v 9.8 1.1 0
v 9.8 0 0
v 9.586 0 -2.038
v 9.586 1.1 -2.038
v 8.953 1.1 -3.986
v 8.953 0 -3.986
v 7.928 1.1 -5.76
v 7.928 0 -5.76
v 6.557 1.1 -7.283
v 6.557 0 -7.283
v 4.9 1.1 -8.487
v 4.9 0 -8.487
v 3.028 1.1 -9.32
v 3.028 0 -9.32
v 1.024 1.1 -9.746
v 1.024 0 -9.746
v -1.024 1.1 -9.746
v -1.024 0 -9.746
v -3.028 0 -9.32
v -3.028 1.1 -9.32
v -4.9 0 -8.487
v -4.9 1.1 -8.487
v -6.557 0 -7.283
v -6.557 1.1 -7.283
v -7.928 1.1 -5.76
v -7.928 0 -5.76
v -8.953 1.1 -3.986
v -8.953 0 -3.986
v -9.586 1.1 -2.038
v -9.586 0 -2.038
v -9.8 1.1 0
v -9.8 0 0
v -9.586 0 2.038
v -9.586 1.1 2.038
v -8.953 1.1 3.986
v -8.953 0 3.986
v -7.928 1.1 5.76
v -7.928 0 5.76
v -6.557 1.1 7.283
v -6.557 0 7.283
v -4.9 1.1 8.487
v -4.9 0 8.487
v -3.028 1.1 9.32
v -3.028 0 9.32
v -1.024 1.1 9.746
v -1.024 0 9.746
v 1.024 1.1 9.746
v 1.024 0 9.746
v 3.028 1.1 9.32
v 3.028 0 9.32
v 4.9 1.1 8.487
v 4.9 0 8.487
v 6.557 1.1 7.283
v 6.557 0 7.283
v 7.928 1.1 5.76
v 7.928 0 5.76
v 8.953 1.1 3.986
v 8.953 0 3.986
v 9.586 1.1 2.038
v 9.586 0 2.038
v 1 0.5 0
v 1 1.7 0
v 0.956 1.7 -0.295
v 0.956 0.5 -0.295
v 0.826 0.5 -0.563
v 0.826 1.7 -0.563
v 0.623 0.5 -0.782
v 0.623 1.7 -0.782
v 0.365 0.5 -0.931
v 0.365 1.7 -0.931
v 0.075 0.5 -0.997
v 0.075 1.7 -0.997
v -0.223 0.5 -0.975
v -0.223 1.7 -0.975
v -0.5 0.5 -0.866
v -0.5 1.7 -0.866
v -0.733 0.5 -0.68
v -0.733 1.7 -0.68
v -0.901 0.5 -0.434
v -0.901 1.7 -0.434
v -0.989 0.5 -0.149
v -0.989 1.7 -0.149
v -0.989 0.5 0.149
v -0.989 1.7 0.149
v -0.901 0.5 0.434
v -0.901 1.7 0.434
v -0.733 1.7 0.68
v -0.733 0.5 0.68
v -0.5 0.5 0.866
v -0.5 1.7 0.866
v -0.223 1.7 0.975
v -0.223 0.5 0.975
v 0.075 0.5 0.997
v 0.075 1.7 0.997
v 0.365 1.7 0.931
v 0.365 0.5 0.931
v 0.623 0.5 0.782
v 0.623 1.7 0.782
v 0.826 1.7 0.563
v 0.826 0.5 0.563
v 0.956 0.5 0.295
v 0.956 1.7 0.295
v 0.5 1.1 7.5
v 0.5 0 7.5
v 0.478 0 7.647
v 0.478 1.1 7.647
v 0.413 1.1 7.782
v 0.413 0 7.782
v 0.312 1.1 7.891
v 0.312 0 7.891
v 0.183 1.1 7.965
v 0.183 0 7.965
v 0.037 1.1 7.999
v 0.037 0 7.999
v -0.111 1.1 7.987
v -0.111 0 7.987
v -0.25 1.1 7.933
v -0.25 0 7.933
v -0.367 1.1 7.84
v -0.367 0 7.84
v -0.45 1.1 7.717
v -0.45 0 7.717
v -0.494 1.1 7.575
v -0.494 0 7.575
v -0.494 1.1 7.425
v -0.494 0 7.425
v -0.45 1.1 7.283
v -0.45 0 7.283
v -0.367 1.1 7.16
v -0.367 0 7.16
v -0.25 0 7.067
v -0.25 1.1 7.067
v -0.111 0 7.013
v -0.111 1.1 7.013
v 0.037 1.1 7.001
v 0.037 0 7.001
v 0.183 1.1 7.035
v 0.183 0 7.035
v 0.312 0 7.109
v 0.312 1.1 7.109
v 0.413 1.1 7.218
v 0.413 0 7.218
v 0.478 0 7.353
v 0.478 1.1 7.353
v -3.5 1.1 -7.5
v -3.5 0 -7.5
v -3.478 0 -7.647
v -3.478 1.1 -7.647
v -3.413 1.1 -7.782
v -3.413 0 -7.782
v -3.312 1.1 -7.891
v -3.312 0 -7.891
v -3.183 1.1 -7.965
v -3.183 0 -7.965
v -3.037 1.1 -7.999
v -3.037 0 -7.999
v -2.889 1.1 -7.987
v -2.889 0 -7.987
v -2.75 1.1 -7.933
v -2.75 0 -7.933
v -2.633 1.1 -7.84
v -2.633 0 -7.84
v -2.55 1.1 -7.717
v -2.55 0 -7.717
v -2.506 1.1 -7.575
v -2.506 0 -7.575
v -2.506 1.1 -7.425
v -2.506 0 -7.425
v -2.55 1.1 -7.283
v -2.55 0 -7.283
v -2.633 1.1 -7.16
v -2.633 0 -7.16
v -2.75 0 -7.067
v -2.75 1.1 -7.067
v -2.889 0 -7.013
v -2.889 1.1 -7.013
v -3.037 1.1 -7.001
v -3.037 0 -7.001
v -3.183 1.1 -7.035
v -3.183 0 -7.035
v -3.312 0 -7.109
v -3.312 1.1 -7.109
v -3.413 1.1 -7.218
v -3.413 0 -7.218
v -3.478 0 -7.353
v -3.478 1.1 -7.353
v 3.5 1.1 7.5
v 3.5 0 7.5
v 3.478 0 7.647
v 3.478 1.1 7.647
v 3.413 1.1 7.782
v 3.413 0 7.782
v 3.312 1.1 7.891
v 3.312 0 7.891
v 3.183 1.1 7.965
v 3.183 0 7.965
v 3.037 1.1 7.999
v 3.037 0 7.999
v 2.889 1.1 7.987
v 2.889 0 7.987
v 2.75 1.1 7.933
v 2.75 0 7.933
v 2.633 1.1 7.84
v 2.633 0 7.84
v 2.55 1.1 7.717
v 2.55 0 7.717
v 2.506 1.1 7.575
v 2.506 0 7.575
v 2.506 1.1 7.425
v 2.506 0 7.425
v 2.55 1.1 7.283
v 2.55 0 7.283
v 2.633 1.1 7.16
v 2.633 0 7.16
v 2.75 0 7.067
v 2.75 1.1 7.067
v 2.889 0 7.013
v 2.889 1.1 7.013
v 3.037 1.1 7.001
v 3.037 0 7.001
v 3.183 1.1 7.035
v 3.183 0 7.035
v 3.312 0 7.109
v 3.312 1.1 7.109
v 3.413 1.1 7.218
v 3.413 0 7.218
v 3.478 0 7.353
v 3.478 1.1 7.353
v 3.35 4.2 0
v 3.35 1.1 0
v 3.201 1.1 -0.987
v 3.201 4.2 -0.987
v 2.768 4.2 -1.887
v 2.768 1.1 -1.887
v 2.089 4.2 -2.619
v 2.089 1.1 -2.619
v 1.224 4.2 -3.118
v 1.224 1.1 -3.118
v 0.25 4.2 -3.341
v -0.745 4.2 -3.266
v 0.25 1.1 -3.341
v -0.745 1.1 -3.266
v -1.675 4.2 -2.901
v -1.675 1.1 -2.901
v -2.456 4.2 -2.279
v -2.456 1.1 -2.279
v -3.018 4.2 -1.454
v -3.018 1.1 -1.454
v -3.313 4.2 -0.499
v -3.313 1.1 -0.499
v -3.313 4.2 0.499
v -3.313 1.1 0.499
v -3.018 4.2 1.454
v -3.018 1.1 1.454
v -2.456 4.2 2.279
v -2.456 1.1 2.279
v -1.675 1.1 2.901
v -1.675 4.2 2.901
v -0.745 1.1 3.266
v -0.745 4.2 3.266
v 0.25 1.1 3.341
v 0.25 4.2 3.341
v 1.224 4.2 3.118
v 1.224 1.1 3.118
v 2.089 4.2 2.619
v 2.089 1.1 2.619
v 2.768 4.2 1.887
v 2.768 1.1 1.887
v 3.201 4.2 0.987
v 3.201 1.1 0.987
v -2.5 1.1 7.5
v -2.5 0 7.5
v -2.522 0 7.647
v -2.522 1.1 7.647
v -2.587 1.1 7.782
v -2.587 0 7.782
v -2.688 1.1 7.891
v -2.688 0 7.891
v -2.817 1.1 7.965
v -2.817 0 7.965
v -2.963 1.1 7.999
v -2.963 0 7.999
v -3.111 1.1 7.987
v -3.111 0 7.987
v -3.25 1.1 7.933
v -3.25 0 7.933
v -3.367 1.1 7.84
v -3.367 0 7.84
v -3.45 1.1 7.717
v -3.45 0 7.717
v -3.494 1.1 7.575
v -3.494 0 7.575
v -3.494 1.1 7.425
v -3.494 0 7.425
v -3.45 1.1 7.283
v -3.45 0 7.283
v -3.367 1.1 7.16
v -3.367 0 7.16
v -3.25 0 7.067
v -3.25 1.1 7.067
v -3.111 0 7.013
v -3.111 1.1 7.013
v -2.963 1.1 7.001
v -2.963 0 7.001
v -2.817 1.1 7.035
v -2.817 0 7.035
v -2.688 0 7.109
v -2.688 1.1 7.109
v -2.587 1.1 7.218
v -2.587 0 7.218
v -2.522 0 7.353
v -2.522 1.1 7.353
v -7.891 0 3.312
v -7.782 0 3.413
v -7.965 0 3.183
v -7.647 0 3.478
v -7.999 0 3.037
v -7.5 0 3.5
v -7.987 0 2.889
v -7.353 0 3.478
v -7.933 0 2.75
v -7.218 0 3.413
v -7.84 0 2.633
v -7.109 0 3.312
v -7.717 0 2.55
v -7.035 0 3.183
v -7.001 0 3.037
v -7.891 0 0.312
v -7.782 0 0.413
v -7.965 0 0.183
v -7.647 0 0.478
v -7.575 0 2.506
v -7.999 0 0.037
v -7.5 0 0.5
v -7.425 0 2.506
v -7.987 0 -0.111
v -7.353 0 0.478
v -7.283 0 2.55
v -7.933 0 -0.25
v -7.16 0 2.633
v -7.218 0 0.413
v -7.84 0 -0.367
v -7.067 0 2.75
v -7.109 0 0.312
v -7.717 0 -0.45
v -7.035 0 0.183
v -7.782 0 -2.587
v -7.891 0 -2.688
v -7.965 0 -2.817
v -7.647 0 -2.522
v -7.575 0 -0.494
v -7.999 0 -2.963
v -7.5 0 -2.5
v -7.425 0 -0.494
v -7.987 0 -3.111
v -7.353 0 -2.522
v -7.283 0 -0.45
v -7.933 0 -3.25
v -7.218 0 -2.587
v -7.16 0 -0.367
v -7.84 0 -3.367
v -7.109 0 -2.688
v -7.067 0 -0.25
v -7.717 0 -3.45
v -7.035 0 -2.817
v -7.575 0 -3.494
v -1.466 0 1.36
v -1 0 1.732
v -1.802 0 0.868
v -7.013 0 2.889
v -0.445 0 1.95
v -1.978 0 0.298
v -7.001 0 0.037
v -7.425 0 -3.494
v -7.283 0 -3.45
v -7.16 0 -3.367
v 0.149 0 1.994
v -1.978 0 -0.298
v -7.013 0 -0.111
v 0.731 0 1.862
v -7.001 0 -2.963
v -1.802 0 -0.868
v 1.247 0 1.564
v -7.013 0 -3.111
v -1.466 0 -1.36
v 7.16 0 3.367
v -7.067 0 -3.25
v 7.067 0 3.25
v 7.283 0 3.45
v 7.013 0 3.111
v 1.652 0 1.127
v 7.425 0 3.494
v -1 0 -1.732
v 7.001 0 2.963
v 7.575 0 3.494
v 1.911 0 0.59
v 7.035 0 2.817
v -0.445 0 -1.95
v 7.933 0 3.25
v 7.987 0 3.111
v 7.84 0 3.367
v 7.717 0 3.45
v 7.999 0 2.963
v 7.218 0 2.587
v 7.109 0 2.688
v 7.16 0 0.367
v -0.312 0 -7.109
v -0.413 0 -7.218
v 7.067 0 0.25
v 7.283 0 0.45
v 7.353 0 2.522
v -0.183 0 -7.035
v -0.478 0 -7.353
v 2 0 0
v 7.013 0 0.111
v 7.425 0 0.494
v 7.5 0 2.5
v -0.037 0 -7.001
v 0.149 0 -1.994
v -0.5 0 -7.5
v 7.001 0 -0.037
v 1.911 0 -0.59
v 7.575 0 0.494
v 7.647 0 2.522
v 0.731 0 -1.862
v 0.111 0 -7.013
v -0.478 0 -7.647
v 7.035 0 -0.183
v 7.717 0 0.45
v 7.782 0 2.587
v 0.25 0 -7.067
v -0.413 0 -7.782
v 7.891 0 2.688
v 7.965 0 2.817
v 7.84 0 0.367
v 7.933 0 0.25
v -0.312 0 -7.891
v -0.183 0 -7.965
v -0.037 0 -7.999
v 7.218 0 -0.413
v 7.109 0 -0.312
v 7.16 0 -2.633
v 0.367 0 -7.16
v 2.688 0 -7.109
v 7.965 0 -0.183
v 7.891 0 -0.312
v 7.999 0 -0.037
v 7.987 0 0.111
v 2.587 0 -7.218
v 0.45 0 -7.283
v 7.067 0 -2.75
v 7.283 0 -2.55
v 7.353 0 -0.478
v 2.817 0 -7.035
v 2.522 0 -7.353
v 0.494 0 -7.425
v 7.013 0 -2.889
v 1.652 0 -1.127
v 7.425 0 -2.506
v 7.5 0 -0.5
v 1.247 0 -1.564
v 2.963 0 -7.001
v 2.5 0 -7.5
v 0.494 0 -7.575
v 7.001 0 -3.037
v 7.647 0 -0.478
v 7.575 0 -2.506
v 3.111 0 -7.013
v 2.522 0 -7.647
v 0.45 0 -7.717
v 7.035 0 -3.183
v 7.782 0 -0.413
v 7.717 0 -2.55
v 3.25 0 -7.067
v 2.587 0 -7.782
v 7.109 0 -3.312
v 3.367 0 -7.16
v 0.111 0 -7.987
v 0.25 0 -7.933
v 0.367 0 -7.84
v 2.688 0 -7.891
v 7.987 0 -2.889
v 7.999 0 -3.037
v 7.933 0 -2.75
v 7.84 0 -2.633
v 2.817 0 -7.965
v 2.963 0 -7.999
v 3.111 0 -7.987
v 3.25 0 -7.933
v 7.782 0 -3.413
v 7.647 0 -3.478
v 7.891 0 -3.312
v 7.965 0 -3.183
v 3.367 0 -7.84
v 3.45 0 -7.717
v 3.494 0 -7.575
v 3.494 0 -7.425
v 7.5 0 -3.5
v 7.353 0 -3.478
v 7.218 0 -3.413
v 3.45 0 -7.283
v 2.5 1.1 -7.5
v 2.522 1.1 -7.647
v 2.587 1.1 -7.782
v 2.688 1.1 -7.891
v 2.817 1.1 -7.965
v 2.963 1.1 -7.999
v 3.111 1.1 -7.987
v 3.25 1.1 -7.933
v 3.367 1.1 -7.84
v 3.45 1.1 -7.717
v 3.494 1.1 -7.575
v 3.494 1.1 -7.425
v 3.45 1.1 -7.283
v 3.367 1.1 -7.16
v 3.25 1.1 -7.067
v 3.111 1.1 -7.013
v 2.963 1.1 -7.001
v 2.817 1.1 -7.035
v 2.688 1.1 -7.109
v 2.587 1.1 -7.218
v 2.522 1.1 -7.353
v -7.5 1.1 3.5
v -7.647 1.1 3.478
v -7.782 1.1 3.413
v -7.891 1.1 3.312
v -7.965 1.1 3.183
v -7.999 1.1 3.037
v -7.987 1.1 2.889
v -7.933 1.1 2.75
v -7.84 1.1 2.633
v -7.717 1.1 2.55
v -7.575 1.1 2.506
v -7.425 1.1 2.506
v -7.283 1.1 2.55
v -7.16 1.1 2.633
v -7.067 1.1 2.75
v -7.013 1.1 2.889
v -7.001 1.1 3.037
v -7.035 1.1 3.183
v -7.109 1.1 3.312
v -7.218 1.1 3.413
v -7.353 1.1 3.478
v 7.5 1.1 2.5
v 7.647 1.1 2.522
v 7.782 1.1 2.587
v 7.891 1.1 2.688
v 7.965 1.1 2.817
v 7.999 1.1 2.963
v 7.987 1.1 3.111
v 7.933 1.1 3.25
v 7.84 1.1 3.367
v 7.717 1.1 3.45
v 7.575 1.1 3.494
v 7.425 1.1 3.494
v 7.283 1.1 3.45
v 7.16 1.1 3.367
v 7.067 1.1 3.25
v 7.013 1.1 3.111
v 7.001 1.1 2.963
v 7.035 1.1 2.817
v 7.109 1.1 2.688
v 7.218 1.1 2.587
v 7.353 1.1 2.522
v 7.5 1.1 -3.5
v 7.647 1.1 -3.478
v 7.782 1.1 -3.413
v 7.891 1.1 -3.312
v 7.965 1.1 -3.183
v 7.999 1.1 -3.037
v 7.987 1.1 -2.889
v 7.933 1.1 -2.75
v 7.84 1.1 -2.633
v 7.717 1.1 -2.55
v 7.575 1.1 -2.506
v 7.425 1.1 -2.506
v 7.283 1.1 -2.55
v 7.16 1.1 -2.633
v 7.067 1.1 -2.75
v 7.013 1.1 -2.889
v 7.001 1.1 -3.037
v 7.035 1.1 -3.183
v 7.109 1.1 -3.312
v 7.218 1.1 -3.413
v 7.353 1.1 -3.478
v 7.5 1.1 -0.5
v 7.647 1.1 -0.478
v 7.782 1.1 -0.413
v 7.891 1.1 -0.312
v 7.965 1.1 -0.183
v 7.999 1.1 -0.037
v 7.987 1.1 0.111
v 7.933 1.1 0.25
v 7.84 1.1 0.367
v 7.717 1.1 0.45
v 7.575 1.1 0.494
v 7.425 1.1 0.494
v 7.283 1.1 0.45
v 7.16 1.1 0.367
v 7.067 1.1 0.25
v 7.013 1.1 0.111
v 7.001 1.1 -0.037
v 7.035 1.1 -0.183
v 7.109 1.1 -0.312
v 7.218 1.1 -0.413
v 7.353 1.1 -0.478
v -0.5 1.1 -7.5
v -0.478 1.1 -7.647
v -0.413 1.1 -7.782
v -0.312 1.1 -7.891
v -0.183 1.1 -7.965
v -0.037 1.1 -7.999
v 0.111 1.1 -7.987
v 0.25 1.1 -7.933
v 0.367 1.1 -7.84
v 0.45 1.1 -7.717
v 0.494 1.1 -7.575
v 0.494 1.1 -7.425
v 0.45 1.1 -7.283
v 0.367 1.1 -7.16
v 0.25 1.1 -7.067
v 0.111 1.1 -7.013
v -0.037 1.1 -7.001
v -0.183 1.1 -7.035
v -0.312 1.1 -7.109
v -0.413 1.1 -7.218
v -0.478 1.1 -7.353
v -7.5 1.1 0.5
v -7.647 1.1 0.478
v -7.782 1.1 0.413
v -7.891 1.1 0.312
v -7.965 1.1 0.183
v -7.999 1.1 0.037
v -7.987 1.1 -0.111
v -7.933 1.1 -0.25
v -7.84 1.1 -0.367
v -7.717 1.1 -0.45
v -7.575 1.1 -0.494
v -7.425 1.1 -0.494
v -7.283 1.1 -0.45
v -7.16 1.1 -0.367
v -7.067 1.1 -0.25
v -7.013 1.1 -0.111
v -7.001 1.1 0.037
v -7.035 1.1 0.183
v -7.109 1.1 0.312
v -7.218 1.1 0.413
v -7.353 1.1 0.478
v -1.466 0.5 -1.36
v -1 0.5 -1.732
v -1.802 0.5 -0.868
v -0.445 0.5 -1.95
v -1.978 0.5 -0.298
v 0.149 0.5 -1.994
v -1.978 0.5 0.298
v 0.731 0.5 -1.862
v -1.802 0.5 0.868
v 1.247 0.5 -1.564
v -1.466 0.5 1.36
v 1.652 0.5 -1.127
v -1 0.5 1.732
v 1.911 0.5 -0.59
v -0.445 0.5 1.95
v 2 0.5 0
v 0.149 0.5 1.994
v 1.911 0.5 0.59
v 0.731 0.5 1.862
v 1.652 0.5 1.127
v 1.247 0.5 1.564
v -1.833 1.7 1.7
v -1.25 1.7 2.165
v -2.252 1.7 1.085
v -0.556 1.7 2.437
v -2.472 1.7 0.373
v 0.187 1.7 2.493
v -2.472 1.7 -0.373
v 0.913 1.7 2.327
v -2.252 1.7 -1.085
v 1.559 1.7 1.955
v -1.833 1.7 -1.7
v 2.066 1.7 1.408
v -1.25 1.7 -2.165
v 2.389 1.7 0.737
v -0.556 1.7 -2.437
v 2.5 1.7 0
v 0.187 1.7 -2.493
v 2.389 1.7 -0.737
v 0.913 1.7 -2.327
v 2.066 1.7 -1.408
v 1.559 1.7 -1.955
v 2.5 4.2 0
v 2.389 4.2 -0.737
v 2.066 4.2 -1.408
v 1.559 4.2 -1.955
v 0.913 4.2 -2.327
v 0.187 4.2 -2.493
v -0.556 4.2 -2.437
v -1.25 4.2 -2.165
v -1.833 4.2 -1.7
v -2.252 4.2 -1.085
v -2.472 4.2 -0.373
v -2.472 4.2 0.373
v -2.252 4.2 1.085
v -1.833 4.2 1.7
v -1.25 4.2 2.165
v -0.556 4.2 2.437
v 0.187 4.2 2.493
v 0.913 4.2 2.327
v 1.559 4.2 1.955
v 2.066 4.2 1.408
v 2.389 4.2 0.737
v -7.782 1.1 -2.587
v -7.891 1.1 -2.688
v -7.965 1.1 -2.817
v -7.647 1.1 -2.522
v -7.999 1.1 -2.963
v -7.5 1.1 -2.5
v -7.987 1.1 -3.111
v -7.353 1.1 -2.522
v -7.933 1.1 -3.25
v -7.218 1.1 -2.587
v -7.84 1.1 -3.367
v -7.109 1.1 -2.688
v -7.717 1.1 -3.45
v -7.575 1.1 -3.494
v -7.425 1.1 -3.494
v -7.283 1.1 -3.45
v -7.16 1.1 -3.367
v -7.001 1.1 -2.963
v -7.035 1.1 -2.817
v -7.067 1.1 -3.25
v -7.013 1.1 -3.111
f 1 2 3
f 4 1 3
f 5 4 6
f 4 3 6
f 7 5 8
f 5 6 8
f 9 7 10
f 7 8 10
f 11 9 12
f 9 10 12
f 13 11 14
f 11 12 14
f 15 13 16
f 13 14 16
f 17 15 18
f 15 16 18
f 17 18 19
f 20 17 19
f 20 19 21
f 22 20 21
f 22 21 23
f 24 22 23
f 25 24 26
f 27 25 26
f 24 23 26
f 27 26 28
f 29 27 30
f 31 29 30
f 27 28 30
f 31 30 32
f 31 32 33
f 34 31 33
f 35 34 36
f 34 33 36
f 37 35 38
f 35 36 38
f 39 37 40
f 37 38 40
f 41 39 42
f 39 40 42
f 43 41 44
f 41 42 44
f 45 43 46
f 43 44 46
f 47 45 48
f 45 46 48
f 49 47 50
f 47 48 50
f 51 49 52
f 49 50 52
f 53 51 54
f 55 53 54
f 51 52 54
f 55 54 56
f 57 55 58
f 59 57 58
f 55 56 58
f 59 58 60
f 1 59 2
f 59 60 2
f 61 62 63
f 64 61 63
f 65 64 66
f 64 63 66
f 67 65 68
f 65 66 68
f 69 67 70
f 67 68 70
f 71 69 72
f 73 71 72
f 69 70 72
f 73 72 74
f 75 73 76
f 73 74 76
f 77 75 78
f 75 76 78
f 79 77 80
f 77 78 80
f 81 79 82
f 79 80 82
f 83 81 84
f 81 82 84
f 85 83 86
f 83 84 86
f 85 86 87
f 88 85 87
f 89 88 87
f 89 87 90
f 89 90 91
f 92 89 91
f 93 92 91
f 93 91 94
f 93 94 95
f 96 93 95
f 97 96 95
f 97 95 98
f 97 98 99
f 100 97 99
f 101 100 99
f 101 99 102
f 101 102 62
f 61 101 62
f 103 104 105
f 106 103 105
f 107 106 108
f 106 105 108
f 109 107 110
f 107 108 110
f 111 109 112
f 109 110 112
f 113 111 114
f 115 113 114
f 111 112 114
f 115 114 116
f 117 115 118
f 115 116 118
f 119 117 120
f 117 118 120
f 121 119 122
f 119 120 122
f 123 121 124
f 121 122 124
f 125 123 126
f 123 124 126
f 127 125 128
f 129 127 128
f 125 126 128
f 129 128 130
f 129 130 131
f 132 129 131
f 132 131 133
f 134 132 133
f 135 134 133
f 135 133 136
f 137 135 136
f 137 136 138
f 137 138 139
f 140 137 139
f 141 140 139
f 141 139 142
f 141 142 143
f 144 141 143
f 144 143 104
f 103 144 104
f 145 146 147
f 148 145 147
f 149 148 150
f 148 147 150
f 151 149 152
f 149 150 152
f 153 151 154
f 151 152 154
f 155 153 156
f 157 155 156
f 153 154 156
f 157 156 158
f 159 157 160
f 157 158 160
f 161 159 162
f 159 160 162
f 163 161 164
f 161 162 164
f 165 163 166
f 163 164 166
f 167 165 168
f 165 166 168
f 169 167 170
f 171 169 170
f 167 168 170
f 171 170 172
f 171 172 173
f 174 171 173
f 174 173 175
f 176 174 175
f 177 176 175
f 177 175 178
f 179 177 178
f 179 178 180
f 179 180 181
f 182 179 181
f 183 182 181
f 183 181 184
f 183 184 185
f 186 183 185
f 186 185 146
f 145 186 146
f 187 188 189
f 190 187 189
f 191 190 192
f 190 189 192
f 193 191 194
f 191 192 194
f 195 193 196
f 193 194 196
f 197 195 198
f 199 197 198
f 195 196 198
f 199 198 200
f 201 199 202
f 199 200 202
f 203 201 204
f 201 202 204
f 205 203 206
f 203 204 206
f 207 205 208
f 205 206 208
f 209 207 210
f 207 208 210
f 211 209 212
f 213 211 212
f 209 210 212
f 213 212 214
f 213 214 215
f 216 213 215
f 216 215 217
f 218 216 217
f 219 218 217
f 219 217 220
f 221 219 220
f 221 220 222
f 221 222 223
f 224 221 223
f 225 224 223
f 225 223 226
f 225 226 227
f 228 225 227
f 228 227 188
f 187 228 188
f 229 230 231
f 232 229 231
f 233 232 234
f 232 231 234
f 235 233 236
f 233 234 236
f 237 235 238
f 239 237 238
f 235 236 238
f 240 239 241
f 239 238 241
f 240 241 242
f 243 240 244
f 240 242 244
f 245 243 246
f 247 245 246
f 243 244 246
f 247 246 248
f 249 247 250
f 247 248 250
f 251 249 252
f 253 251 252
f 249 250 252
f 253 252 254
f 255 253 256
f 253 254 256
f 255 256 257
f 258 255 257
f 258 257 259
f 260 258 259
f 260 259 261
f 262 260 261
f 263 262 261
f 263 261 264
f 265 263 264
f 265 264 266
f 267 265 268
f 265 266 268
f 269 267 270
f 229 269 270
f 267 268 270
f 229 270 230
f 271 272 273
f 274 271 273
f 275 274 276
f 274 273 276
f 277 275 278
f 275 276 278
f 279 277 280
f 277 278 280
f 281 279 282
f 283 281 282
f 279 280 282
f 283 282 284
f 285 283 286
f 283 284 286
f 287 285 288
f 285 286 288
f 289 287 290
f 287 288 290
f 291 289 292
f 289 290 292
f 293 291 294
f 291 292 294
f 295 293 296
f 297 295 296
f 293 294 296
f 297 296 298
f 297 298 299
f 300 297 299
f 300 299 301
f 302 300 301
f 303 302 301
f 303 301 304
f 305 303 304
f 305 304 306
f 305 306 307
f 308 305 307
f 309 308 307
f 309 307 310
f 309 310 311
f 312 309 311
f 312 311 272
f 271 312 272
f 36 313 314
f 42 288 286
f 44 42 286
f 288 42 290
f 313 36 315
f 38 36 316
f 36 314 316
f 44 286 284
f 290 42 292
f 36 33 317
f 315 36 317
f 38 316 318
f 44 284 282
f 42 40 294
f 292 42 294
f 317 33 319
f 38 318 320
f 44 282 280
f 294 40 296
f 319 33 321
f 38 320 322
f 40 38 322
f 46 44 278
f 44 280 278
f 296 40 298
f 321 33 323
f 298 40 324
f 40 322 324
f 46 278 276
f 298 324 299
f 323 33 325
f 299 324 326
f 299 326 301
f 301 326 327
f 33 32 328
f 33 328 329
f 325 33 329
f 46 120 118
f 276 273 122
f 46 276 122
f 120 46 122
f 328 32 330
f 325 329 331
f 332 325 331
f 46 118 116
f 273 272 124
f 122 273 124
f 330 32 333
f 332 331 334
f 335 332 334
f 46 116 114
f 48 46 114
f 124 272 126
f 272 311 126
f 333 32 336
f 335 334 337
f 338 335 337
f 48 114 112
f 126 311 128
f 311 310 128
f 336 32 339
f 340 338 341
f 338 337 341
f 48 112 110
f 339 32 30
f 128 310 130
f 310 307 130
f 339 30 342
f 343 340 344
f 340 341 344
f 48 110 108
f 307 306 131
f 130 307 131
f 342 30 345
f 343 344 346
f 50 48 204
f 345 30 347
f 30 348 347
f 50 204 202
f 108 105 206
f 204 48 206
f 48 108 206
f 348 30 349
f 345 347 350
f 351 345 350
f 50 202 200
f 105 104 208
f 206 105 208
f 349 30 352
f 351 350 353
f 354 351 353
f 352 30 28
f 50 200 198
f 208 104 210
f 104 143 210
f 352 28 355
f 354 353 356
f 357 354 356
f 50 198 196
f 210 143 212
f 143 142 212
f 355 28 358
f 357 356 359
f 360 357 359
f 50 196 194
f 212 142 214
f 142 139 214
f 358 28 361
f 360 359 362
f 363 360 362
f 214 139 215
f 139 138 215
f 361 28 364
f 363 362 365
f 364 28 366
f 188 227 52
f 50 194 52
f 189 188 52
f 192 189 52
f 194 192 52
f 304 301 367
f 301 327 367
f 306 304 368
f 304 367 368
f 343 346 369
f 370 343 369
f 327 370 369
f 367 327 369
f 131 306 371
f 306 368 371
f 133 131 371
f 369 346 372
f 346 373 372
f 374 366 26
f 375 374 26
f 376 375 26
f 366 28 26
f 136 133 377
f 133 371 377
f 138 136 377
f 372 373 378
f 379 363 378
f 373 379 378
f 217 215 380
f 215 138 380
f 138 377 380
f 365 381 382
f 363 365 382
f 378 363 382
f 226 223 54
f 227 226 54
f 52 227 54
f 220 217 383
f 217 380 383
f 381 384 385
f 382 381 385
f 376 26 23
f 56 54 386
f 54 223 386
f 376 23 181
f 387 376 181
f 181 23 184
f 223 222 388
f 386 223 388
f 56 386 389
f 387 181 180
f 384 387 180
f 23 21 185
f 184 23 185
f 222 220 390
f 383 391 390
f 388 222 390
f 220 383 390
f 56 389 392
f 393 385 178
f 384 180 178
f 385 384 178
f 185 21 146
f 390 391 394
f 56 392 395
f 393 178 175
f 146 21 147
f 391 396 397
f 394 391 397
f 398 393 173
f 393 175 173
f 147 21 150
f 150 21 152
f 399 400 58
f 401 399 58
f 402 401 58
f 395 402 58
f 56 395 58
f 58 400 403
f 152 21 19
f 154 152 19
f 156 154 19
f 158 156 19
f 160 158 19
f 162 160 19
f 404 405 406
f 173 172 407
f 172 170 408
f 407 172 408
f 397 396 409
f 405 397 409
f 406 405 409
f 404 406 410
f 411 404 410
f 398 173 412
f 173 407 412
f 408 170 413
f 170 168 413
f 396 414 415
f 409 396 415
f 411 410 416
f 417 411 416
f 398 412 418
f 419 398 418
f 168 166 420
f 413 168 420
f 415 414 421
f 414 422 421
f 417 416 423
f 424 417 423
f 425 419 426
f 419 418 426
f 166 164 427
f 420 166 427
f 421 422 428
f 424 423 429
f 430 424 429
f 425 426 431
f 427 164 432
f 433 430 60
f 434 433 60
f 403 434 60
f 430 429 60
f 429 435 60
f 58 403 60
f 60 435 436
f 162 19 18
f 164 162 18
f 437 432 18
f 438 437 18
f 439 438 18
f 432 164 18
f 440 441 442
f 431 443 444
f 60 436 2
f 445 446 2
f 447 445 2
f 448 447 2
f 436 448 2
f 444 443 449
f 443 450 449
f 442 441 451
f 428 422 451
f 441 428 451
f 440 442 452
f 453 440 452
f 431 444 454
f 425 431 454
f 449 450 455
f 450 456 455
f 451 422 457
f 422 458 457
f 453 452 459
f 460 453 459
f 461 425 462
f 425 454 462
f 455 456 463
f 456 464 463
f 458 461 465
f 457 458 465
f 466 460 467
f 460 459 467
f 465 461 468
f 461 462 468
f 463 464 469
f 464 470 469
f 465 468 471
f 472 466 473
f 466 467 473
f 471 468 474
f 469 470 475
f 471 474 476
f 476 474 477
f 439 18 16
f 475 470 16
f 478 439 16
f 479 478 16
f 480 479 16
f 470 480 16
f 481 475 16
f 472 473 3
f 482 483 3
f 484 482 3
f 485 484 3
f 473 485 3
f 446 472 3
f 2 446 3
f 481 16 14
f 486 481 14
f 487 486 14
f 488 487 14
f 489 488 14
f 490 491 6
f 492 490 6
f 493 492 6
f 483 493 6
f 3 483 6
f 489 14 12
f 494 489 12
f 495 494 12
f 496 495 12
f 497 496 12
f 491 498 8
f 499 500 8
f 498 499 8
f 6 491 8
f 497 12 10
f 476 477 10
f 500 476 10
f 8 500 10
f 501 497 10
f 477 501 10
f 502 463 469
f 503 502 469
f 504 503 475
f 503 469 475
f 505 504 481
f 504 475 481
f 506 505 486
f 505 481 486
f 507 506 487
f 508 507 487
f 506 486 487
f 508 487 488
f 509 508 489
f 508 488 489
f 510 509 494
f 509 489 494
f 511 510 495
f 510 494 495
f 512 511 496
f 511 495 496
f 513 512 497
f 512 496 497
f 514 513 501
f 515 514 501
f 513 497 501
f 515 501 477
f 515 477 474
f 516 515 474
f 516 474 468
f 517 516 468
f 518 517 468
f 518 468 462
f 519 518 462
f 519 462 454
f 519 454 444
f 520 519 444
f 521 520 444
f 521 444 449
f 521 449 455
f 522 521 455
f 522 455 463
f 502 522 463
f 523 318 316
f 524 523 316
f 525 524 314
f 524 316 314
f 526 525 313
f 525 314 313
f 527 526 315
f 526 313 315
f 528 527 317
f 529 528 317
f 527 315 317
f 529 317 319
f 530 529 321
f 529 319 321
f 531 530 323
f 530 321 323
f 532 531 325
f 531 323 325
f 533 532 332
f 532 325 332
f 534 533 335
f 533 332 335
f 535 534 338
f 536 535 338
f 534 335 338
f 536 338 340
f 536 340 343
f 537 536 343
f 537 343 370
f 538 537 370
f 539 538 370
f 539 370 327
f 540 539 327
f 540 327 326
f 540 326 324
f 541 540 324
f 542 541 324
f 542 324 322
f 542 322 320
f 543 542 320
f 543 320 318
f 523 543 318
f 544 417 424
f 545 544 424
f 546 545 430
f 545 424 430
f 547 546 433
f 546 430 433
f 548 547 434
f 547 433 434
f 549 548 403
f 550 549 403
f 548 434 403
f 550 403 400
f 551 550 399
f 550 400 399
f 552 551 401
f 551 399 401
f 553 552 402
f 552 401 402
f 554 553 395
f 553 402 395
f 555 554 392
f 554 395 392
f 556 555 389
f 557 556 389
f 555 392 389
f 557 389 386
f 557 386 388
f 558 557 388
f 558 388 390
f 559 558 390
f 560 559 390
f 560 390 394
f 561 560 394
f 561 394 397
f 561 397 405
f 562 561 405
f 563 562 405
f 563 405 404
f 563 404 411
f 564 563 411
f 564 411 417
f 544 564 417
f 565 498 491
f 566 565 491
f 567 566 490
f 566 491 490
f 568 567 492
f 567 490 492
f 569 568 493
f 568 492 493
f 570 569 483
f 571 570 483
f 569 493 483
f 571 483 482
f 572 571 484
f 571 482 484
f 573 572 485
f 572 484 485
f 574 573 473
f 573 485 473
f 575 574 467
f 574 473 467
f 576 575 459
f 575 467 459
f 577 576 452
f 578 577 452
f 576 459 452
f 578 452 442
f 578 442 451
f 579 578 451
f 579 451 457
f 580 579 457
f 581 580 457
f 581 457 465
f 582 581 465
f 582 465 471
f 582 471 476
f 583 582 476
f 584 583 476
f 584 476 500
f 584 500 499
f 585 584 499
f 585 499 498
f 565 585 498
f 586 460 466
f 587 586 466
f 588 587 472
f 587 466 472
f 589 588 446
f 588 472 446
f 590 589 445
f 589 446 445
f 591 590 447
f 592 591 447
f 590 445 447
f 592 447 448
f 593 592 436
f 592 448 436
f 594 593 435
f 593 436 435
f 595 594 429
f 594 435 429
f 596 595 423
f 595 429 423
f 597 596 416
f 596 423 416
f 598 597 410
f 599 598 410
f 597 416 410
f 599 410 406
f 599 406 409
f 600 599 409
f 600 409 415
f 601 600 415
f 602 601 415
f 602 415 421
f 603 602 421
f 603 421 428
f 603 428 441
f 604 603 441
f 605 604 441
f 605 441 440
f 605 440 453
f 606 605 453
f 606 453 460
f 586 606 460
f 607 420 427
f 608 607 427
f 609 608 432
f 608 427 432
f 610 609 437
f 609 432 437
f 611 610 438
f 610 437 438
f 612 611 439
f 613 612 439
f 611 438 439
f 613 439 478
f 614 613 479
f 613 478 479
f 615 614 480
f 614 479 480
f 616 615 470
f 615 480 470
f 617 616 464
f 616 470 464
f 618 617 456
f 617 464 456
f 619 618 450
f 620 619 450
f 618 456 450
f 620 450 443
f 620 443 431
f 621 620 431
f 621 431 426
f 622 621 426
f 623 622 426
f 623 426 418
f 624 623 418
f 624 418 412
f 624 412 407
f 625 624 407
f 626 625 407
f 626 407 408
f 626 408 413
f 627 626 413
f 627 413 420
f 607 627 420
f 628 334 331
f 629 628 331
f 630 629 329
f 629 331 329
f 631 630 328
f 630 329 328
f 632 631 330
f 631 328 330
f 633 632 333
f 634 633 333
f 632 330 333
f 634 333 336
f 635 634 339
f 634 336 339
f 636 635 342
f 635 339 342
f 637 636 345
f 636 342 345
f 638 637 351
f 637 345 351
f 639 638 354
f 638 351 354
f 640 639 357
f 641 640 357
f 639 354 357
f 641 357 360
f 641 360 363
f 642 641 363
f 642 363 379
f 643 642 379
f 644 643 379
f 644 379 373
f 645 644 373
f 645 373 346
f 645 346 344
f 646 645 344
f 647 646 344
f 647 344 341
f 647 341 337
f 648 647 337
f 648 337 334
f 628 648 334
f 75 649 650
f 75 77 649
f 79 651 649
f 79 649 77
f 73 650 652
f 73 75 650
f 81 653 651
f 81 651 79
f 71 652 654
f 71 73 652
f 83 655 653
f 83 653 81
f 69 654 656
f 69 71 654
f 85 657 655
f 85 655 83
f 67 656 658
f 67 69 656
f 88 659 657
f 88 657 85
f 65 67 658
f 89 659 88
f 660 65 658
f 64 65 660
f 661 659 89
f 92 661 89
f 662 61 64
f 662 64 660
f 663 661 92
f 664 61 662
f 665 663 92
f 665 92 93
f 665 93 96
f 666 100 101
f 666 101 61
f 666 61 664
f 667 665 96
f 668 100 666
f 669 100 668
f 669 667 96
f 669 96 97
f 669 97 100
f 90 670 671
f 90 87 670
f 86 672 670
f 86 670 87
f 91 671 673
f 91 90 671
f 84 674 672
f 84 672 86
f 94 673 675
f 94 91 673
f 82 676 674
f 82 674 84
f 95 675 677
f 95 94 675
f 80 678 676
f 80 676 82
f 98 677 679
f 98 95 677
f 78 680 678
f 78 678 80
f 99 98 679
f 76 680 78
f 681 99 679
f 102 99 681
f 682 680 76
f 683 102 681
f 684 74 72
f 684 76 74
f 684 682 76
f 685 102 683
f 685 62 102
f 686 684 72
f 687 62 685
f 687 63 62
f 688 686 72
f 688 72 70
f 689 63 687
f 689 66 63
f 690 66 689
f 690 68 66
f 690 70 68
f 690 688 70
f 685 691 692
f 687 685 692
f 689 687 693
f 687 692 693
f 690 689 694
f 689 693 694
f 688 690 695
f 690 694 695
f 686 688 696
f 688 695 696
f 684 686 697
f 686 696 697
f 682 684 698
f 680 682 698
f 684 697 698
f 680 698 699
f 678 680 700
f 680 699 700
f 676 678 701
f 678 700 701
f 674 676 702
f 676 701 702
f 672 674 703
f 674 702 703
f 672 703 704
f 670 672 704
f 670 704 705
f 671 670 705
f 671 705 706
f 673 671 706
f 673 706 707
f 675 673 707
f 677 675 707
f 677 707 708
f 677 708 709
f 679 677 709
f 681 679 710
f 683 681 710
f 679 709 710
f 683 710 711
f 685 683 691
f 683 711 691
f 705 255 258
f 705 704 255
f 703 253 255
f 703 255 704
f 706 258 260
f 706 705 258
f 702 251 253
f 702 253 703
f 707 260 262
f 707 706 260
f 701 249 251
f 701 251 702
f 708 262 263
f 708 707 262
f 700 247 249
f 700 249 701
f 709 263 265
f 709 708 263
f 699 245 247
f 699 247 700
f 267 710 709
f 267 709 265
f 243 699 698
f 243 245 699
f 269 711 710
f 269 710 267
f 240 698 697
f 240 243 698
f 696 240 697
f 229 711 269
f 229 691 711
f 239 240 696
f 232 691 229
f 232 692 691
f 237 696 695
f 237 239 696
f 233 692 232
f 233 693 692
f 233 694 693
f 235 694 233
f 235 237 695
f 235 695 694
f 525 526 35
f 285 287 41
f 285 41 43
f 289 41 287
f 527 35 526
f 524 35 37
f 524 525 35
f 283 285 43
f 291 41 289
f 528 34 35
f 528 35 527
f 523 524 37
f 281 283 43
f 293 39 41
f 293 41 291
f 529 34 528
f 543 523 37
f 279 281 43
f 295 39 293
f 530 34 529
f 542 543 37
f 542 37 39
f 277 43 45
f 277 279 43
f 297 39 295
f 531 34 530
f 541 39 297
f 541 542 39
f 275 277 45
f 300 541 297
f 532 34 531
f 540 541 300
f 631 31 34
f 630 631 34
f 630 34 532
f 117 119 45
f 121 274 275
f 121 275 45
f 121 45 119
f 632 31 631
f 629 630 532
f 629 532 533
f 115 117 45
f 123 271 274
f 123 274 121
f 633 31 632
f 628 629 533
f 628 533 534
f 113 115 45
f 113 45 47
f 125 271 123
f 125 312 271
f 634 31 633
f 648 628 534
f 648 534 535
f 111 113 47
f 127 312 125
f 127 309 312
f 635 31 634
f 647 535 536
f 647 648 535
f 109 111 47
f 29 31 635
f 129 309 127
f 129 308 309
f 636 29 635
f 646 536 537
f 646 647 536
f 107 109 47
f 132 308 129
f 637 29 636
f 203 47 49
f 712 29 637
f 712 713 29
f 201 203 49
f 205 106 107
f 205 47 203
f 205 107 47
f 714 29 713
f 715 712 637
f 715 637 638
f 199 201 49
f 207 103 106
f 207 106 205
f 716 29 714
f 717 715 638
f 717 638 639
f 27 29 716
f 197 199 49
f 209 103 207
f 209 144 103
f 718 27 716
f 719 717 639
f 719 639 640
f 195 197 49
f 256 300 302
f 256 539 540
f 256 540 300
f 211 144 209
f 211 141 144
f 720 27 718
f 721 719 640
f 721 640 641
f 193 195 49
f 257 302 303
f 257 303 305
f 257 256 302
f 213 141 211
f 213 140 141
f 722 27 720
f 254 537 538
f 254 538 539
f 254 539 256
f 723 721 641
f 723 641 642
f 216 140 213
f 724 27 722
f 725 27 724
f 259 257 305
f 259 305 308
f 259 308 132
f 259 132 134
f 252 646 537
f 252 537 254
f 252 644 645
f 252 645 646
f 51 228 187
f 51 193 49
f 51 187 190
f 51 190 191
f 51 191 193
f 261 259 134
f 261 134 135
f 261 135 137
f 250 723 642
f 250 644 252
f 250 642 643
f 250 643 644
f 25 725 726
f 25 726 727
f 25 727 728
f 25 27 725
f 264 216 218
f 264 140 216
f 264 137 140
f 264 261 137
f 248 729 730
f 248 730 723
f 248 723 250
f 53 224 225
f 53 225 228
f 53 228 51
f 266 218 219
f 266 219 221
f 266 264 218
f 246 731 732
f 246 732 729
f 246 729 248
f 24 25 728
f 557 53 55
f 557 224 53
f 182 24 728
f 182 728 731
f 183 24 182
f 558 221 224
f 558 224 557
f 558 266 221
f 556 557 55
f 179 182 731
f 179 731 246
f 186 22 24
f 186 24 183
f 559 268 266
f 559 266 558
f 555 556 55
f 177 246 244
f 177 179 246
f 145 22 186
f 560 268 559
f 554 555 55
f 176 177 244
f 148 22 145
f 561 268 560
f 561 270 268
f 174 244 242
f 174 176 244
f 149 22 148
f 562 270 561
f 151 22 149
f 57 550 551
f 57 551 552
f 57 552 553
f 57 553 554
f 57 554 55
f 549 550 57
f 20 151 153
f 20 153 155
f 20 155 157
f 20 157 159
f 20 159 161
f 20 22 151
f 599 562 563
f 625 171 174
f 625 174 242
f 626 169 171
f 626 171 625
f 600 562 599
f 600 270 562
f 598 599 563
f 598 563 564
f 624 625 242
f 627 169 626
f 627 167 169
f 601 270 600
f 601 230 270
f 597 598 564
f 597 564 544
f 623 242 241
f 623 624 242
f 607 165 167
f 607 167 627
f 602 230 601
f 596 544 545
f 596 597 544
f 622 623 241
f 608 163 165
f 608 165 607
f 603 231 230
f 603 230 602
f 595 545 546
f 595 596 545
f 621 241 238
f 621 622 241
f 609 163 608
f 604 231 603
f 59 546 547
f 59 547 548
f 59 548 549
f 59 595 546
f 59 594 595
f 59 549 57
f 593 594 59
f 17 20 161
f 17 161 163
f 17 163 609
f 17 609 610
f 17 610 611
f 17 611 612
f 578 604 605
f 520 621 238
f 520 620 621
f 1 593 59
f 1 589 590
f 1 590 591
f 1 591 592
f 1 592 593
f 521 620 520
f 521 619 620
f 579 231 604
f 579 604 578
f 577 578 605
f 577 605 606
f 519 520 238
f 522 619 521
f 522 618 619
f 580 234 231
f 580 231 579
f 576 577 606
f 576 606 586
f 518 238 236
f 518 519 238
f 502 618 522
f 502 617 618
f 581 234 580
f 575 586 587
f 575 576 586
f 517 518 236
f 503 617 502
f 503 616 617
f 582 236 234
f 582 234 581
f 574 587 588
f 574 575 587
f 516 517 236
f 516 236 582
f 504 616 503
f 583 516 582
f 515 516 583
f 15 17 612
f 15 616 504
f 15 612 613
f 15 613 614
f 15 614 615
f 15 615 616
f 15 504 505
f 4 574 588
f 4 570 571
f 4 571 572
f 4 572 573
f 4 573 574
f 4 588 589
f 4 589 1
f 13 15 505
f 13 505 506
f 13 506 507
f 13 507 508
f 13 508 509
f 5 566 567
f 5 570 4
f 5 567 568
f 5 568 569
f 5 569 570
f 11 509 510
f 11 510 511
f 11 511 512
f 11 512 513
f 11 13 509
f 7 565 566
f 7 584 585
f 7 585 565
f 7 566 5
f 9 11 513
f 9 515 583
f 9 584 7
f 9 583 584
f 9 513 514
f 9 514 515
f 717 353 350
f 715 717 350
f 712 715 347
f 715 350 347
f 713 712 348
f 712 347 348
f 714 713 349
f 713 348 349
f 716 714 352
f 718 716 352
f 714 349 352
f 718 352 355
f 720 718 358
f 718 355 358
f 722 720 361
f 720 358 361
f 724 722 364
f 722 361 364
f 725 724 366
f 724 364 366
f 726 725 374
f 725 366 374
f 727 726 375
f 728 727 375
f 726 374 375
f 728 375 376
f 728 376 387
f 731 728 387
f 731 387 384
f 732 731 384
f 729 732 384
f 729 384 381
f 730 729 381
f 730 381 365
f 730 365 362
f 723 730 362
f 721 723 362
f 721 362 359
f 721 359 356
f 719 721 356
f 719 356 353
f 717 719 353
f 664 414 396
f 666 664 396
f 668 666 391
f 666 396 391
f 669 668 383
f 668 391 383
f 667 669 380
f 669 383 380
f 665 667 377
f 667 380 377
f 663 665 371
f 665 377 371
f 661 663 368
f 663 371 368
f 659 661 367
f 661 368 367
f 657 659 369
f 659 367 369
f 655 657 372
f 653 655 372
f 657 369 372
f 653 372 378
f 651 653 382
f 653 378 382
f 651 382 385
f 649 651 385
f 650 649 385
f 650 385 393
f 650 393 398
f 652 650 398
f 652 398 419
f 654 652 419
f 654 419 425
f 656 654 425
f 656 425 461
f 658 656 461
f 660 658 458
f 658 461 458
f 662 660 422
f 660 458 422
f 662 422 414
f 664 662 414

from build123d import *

# Parameters (mm, degrees)
SKETCH1_R           = 9.8
BOSS_EXTRUDE1_DEPTH = 1.1
SKETCH2_R           = 3.35
BOSS_EXTRUDE2_DEPTH = 3.1
SKETCH3_R           = 2.5
CUT_EXTRUDE1_DEPTH  = 2.5
CUT_EXTRUDE2_REACH  = 3.7
SKETCH4_R           = 1
SKETCH5_R           = 2
CUT_EXTRUDE3_DEPTH  = 0.5
SKETCH6_R           = 0.5
CUT_EXTRUDE4_DEPTH  = 5.2
CIRPATTERN1_COUNT   = 4


with BuildPart() as part:
    # Sketch1 → Boss-Extrude1 (new body)
    with BuildSketch(Plane(origin=(0, 0, 0), x_dir=(1, 0, 0), z_dir=(0, 1, 0))):
        Circle(SKETCH1_R)
    extrude(amount=BOSS_EXTRUDE1_DEPTH)

    # Sketch2 → Boss-Extrude2 (add)
    with BuildSketch(Plane(origin=(0, 1.1, 0), x_dir=(1, 0, 0), z_dir=(0, 1, 0))):
        Circle(SKETCH2_R)
    extrude(amount=BOSS_EXTRUDE2_DEPTH)

    # Sketch3 → Cut-Extrude1 (cut)
    with BuildSketch(Plane(origin=(0, 4.2, 0), x_dir=(1, 0, 0), z_dir=(0, 1, 0))):
        Circle(SKETCH3_R)
    extrude(amount=-CUT_EXTRUDE1_DEPTH, mode=Mode.SUBTRACT)

    # Sketch4 → Cut-Extrude2 (cut, up to next)
    with BuildSketch(Plane(origin=(0, 1.7, 0), x_dir=(1, 0, 0), z_dir=(0, 1, 0)), mode=Mode.PRIVATE) as cut_extrude2_sk1:
        Circle(SKETCH4_R)
    cut_extrude2_tool1 = extrude(cut_extrude2_sk1.sketch, amount=-CUT_EXTRUDE2_REACH, mode=Mode.PRIVATE) & part.part
    add(cut_extrude2_tool1.solids().sort_by_distance((0, 1.7, 0))[0], mode=Mode.SUBTRACT)

    # Sketch5 → Cut-Extrude3 (cut)
    with BuildSketch(Plane.XZ):
        Circle(SKETCH5_R)
    extrude(amount=-CUT_EXTRUDE3_DEPTH, mode=Mode.SUBTRACT)

    # Sketch6 → Cut-Extrude4 (cut, through all)
    with BuildSketch(Plane.XZ):
        with Locations((-3, 7.5)):
            Circle(SKETCH6_R)
        with Locations((0, 7.5)):
            Circle(SKETCH6_R)
        with Locations((3, 7.5)):
            Circle(SKETCH6_R)
    cut_extrude4 = extrude(amount=-CUT_EXTRUDE4_DEPTH, mode=Mode.SUBTRACT)

    # CirPattern1: Cut-Extrude4 ×4 about axis
    cirpattern1_axis = Axis((0, 0, 0), (0, 1, 0))
    for i in range(1, CIRPATTERN1_COUNT):
        add(cut_extrude4.rotate(cirpattern1_axis, i * 360 / CIRPATTERN1_COUNT), mode=Mode.SUBTRACT)


solid = part.part
